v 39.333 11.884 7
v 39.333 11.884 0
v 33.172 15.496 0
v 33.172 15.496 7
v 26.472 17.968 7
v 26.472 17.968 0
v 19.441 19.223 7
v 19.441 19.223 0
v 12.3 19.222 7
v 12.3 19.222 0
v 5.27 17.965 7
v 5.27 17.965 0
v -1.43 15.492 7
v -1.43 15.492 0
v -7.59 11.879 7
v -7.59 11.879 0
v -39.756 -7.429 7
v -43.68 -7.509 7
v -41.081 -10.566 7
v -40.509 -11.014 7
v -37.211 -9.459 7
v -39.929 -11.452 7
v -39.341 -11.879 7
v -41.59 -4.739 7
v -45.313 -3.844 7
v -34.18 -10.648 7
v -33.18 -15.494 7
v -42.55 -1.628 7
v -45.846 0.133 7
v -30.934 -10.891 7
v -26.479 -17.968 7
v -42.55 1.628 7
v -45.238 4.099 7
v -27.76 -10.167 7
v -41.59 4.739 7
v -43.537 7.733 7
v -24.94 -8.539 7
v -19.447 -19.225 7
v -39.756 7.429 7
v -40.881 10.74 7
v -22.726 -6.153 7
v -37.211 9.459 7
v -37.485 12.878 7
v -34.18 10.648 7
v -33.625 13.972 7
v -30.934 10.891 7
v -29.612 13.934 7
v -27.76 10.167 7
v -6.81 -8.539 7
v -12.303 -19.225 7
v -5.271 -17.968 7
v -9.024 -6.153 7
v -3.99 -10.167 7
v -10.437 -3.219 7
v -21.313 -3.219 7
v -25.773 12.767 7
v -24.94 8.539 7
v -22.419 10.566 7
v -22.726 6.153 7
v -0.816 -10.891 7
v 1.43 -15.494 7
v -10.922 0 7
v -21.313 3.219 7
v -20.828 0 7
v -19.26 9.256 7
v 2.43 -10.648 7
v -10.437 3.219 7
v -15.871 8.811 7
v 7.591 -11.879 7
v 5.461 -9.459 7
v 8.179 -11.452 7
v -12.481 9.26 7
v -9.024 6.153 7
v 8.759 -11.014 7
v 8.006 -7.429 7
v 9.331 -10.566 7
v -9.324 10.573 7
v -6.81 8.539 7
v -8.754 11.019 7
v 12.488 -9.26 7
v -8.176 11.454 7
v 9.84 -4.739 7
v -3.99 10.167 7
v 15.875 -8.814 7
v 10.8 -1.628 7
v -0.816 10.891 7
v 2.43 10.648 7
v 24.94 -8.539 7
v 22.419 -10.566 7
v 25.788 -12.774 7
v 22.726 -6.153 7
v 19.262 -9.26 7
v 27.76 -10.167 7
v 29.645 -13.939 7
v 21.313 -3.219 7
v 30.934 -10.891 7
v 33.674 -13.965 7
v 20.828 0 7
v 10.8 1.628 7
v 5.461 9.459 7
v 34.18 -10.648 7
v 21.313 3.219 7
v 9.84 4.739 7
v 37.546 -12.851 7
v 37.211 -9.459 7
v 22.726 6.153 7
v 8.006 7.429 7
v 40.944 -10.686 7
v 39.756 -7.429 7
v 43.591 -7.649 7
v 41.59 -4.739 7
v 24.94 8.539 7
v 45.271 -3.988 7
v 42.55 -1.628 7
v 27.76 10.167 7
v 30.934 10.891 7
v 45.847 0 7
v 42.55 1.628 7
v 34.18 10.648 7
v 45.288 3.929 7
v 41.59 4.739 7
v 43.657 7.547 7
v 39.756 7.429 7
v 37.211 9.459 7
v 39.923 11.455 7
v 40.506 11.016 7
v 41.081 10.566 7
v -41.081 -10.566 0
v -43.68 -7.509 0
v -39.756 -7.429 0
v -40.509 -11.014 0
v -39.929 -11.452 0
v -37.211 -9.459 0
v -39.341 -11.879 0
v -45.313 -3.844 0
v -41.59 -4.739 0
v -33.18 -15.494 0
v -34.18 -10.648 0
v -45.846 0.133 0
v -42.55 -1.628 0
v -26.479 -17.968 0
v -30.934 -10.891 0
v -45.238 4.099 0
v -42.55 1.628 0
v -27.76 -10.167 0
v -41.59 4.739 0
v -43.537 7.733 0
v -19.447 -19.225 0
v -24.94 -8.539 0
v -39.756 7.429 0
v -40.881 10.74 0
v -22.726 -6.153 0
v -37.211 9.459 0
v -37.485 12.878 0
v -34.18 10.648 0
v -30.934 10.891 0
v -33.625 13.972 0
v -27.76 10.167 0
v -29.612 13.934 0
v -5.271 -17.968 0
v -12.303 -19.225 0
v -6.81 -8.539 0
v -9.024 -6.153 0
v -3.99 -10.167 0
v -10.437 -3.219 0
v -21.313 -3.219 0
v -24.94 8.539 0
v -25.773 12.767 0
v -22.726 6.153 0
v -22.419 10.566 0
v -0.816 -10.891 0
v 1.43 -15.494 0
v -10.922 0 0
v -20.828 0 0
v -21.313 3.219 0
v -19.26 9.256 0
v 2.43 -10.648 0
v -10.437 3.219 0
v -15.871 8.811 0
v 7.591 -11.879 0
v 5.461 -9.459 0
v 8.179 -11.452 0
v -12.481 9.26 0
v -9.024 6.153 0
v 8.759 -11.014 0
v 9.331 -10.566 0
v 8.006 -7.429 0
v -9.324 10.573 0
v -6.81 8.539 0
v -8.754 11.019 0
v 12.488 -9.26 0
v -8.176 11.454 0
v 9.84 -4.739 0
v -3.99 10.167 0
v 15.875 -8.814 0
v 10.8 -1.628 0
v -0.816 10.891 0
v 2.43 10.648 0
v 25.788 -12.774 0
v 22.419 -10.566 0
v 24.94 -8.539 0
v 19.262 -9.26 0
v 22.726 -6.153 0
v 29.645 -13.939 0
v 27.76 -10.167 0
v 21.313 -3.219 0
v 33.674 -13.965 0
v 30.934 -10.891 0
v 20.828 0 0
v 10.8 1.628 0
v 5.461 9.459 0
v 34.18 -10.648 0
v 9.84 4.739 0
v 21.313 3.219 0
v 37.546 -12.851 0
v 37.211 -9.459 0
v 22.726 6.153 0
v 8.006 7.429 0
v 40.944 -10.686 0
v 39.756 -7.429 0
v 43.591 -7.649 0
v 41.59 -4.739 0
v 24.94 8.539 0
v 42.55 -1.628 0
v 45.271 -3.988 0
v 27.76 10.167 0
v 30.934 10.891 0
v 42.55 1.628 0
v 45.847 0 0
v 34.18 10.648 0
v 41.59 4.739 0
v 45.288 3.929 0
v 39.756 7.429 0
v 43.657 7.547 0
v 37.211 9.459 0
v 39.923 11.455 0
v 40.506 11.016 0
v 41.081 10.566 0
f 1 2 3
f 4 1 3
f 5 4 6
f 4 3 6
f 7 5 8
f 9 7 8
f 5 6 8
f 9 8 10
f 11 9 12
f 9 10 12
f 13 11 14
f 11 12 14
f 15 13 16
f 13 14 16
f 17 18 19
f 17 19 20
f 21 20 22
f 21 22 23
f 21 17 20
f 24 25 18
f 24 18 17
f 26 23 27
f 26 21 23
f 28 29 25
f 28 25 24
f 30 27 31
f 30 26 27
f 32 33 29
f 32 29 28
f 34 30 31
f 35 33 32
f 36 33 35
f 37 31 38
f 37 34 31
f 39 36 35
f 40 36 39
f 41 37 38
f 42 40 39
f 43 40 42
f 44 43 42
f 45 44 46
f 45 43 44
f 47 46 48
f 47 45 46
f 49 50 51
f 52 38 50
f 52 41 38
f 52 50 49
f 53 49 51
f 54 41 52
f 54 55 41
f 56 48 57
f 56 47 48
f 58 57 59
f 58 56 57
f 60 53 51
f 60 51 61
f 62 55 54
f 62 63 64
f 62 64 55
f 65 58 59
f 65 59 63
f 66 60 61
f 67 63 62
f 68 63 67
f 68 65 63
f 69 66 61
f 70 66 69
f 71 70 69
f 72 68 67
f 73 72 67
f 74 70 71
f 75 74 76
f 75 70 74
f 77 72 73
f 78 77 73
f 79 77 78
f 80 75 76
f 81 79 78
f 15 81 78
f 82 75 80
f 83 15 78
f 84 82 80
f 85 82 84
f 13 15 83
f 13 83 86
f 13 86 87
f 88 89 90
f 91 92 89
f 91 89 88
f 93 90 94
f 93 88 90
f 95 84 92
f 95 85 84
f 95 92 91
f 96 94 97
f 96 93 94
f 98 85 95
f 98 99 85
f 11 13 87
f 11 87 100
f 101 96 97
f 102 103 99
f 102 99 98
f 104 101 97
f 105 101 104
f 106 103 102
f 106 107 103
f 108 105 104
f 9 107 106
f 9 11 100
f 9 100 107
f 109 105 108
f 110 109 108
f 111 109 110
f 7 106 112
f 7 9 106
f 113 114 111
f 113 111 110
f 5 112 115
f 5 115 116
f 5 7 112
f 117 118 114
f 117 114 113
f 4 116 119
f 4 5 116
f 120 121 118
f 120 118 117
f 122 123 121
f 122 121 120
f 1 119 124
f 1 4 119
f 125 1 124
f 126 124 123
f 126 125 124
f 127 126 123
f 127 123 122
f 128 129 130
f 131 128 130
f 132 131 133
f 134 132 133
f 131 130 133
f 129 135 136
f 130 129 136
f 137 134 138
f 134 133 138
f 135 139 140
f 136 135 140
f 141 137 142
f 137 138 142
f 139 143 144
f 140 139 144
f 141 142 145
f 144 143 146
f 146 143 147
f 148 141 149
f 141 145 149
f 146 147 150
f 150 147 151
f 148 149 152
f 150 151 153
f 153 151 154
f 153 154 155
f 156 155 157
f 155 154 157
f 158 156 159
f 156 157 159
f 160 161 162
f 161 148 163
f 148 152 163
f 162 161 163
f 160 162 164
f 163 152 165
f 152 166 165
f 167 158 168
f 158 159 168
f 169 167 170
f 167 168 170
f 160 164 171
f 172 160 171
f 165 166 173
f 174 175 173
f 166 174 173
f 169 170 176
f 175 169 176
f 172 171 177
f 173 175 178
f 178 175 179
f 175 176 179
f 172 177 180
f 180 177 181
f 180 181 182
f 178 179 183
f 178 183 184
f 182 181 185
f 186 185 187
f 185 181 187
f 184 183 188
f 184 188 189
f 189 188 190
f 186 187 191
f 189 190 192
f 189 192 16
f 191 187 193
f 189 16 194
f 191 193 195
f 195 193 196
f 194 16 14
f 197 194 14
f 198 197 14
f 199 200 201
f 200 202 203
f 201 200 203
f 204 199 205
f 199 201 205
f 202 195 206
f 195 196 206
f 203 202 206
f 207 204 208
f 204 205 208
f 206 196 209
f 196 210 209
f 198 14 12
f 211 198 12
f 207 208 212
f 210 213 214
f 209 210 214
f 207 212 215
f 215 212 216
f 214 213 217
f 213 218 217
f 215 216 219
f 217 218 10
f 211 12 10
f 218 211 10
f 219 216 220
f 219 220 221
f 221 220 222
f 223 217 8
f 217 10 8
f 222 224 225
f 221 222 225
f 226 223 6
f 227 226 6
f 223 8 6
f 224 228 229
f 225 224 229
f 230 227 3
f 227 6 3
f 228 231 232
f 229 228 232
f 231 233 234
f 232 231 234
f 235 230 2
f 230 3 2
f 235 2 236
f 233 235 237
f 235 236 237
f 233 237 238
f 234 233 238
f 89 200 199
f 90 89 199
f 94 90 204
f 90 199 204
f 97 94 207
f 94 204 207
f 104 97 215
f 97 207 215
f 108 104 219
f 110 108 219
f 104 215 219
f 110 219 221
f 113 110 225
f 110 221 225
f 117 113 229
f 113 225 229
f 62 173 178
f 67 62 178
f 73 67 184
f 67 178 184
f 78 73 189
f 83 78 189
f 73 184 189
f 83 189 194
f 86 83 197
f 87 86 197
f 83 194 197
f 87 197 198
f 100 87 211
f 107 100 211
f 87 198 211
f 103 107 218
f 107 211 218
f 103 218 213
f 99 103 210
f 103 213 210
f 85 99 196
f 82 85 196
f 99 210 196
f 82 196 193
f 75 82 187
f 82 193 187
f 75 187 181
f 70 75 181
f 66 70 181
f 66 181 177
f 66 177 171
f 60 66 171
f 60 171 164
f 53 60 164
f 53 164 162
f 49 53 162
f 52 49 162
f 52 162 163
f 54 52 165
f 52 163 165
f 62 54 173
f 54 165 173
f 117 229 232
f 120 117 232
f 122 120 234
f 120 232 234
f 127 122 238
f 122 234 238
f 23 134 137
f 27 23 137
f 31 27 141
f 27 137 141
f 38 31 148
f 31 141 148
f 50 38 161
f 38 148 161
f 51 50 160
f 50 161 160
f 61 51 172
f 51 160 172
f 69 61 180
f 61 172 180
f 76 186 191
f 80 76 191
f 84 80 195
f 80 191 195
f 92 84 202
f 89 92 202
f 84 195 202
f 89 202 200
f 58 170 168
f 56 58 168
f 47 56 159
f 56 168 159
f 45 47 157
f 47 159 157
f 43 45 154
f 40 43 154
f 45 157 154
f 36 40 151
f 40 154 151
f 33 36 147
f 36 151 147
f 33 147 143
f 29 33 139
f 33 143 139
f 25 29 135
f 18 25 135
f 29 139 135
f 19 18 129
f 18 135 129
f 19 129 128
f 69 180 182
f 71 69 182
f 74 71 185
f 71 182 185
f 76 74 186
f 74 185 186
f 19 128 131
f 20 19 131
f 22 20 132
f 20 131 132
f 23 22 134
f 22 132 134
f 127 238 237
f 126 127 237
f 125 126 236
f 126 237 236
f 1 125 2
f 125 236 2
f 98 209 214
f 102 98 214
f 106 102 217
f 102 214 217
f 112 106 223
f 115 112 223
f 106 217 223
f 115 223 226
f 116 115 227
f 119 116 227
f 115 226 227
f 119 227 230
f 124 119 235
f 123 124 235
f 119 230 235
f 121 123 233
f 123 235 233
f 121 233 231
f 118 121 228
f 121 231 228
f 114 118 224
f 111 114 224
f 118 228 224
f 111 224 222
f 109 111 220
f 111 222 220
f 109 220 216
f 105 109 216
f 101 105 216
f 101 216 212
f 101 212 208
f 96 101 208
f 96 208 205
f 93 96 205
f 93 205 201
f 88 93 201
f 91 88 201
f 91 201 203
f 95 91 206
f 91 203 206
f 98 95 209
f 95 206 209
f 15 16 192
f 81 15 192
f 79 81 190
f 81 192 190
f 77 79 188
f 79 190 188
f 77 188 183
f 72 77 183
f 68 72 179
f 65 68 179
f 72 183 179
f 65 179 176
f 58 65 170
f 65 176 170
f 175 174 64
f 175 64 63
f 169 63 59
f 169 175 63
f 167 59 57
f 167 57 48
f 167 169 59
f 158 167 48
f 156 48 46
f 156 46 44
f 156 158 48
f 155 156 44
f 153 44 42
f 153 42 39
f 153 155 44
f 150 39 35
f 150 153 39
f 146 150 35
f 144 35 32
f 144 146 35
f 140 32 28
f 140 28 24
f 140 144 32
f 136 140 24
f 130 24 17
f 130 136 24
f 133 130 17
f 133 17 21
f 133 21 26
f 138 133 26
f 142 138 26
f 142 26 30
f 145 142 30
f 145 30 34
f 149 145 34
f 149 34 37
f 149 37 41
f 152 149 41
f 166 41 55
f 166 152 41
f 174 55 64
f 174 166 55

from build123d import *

# Parameters (mm, degrees)
F0_R     = 10.922
F1_DEPTH = 7


with BuildPart() as f1:
    # F0 (on Top) → F1 (new body)
    with BuildSketch(Plane.XY):
        with BuildLine():
            ThreePointArc((-39.3408468404, -11.8787395478), (-24.9781006693, -12.3639309467), (-17.653, 0))
            ThreePointArc((-17.653, 0), (-18.8994874853, 5.7956653725), (-22.4185156572, 10.5664))
            ThreePointArc((-22.4185156572, 10.5664), (-42.3164, 9.3314843428), (-41.0814843428, -10.5664))
            ThreePointArc((-41.0814843428, -10.5664), (-40.2200100529, -11.2343007326), (-39.3408468404, -11.8787395478))
        make_face()
        with Locations((-31.75, 0)):
            Circle(F0_R, mode=Mode.SUBTRACT)
        with BuildLine():
            Line((-17.653, 0), (-14.097, 0))
            ThreePointArc((-14.097, 0), (-12.848539058, 5.800039058), (-9.324289058, 10.57275))
            ThreePointArc((-9.324289058, 10.57275), (-15.8705493616, 8.8106264002), (-22.4185156572, 10.5664))
            ThreePointArc((-22.4185156572, 10.5664), (-18.8994874853, 5.7956653725), (-17.653, 0))
        make_face()
        with BuildLine():
            ThreePointArc((7.5908468404, -11.8787395478), (-6.7718993307, -12.3639309467), (-14.097, 0))
            Line((-14.097, 0), (-17.653, 0))
            ThreePointArc((-17.653, 0), (-24.9781006693, -12.3639309467), (-39.3408468404, -11.8787395478))
            ThreePointArc((-39.3408468404, -11.8787395478), (-15.875, -19.383375), (7.5908468404, -11.8787395478))
        make_face()
        with BuildLine():
            Line((14.097, 0), (10.922, 0))
            ThreePointArc((10.922, 0), (0, -10.922), (-10.922, 0))
            Line((-10.922, 0), (-14.097, 0))
            ThreePointArc((-14.097, 0), (-6.7718993307, -12.3639309467), (7.5908468404, -11.8787395478))
            ThreePointArc((7.5908468404, -11.8787395478), (8.4700100529, -11.2343007326), (9.3314843428, -10.5664))
            ThreePointArc((9.3314843428, -10.5664), (12.8505125147, -5.7956653725), (14.097, 0))
        make_face()
        with BuildLine():
            ThreePointArc((-10.922, 0), (0, 10.922), (10.922, 0))
            Line((10.922, 0), (14.097, 0))
            ThreePointArc((14.097, 0), (6.7722595018, 12.3637336691), (-7.5901547478, 11.879181786))
            ThreePointArc((-7.5901547478, 11.879181786), (-8.4659884875, 11.2376025013), (-9.324289058, 10.57275))
            ThreePointArc((-9.324289058, 10.57275), (-12.848539058, 5.800039058), (-14.097, 0))
            Line((-14.097, 0), (-10.922, 0))
        make_face()
        with BuildLine():
            ThreePointArc((-7.5901547478, 11.879181786), (6.7722595018, 12.3637336691), (14.097, 0))
            Line((14.097, 0), (17.653, 0))
            ThreePointArc((17.653, 0), (24.9738232973, 12.3615872077), (39.3326252102, 11.8839893942))
            ThreePointArc((39.3326252102, 11.8839893942), (15.8704669391, 19.3801997895), (-7.5901547478, 11.879181786))
        make_face()
        with BuildLine():
            Line((17.653, 0), (14.097, 0))
            ThreePointArc((14.097, 0), (12.8505125147, -5.7956653725), (9.3314843428, -10.5664))
            ThreePointArc((9.3314843428, -10.5664), (15.875, -8.8138), (22.4185156572, -10.5664))
            ThreePointArc((22.4185156572, -10.5664), (18.8994874853, -5.7956653725), (17.653, 0))
        make_face()
        with BuildLine():
            ThreePointArc((39.3326252102, 11.8839893942), (24.9738232973, 12.3615872077), (17.653, 0))
            ThreePointArc((17.653, 0), (18.8994874853, -5.7956653725), (22.4185156572, -10.5664))
            ThreePointArc((22.4185156572, -10.5664), (37.5456653725, -12.8505125147), (45.847, 0))
            ThreePointArc((45.847, 0), (44.6005125147, 5.7956653725), (41.0814843428, 10.5664))
            ThreePointArc((41.0814843428, 10.5664), (40.2159714919, 11.2370300074), (39.3326252102, 11.8839893942))
        make_face()
        with BuildLine():
            ThreePointArc((42.672, 0), (31.75, -10.922), (20.828, 0))
            ThreePointArc((20.828, 0), (31.75, 10.922), (42.672, 0))
        make_face(mode=Mode.SUBTRACT)
    extrude(amount=F1_DEPTH)


solid = f1.part
